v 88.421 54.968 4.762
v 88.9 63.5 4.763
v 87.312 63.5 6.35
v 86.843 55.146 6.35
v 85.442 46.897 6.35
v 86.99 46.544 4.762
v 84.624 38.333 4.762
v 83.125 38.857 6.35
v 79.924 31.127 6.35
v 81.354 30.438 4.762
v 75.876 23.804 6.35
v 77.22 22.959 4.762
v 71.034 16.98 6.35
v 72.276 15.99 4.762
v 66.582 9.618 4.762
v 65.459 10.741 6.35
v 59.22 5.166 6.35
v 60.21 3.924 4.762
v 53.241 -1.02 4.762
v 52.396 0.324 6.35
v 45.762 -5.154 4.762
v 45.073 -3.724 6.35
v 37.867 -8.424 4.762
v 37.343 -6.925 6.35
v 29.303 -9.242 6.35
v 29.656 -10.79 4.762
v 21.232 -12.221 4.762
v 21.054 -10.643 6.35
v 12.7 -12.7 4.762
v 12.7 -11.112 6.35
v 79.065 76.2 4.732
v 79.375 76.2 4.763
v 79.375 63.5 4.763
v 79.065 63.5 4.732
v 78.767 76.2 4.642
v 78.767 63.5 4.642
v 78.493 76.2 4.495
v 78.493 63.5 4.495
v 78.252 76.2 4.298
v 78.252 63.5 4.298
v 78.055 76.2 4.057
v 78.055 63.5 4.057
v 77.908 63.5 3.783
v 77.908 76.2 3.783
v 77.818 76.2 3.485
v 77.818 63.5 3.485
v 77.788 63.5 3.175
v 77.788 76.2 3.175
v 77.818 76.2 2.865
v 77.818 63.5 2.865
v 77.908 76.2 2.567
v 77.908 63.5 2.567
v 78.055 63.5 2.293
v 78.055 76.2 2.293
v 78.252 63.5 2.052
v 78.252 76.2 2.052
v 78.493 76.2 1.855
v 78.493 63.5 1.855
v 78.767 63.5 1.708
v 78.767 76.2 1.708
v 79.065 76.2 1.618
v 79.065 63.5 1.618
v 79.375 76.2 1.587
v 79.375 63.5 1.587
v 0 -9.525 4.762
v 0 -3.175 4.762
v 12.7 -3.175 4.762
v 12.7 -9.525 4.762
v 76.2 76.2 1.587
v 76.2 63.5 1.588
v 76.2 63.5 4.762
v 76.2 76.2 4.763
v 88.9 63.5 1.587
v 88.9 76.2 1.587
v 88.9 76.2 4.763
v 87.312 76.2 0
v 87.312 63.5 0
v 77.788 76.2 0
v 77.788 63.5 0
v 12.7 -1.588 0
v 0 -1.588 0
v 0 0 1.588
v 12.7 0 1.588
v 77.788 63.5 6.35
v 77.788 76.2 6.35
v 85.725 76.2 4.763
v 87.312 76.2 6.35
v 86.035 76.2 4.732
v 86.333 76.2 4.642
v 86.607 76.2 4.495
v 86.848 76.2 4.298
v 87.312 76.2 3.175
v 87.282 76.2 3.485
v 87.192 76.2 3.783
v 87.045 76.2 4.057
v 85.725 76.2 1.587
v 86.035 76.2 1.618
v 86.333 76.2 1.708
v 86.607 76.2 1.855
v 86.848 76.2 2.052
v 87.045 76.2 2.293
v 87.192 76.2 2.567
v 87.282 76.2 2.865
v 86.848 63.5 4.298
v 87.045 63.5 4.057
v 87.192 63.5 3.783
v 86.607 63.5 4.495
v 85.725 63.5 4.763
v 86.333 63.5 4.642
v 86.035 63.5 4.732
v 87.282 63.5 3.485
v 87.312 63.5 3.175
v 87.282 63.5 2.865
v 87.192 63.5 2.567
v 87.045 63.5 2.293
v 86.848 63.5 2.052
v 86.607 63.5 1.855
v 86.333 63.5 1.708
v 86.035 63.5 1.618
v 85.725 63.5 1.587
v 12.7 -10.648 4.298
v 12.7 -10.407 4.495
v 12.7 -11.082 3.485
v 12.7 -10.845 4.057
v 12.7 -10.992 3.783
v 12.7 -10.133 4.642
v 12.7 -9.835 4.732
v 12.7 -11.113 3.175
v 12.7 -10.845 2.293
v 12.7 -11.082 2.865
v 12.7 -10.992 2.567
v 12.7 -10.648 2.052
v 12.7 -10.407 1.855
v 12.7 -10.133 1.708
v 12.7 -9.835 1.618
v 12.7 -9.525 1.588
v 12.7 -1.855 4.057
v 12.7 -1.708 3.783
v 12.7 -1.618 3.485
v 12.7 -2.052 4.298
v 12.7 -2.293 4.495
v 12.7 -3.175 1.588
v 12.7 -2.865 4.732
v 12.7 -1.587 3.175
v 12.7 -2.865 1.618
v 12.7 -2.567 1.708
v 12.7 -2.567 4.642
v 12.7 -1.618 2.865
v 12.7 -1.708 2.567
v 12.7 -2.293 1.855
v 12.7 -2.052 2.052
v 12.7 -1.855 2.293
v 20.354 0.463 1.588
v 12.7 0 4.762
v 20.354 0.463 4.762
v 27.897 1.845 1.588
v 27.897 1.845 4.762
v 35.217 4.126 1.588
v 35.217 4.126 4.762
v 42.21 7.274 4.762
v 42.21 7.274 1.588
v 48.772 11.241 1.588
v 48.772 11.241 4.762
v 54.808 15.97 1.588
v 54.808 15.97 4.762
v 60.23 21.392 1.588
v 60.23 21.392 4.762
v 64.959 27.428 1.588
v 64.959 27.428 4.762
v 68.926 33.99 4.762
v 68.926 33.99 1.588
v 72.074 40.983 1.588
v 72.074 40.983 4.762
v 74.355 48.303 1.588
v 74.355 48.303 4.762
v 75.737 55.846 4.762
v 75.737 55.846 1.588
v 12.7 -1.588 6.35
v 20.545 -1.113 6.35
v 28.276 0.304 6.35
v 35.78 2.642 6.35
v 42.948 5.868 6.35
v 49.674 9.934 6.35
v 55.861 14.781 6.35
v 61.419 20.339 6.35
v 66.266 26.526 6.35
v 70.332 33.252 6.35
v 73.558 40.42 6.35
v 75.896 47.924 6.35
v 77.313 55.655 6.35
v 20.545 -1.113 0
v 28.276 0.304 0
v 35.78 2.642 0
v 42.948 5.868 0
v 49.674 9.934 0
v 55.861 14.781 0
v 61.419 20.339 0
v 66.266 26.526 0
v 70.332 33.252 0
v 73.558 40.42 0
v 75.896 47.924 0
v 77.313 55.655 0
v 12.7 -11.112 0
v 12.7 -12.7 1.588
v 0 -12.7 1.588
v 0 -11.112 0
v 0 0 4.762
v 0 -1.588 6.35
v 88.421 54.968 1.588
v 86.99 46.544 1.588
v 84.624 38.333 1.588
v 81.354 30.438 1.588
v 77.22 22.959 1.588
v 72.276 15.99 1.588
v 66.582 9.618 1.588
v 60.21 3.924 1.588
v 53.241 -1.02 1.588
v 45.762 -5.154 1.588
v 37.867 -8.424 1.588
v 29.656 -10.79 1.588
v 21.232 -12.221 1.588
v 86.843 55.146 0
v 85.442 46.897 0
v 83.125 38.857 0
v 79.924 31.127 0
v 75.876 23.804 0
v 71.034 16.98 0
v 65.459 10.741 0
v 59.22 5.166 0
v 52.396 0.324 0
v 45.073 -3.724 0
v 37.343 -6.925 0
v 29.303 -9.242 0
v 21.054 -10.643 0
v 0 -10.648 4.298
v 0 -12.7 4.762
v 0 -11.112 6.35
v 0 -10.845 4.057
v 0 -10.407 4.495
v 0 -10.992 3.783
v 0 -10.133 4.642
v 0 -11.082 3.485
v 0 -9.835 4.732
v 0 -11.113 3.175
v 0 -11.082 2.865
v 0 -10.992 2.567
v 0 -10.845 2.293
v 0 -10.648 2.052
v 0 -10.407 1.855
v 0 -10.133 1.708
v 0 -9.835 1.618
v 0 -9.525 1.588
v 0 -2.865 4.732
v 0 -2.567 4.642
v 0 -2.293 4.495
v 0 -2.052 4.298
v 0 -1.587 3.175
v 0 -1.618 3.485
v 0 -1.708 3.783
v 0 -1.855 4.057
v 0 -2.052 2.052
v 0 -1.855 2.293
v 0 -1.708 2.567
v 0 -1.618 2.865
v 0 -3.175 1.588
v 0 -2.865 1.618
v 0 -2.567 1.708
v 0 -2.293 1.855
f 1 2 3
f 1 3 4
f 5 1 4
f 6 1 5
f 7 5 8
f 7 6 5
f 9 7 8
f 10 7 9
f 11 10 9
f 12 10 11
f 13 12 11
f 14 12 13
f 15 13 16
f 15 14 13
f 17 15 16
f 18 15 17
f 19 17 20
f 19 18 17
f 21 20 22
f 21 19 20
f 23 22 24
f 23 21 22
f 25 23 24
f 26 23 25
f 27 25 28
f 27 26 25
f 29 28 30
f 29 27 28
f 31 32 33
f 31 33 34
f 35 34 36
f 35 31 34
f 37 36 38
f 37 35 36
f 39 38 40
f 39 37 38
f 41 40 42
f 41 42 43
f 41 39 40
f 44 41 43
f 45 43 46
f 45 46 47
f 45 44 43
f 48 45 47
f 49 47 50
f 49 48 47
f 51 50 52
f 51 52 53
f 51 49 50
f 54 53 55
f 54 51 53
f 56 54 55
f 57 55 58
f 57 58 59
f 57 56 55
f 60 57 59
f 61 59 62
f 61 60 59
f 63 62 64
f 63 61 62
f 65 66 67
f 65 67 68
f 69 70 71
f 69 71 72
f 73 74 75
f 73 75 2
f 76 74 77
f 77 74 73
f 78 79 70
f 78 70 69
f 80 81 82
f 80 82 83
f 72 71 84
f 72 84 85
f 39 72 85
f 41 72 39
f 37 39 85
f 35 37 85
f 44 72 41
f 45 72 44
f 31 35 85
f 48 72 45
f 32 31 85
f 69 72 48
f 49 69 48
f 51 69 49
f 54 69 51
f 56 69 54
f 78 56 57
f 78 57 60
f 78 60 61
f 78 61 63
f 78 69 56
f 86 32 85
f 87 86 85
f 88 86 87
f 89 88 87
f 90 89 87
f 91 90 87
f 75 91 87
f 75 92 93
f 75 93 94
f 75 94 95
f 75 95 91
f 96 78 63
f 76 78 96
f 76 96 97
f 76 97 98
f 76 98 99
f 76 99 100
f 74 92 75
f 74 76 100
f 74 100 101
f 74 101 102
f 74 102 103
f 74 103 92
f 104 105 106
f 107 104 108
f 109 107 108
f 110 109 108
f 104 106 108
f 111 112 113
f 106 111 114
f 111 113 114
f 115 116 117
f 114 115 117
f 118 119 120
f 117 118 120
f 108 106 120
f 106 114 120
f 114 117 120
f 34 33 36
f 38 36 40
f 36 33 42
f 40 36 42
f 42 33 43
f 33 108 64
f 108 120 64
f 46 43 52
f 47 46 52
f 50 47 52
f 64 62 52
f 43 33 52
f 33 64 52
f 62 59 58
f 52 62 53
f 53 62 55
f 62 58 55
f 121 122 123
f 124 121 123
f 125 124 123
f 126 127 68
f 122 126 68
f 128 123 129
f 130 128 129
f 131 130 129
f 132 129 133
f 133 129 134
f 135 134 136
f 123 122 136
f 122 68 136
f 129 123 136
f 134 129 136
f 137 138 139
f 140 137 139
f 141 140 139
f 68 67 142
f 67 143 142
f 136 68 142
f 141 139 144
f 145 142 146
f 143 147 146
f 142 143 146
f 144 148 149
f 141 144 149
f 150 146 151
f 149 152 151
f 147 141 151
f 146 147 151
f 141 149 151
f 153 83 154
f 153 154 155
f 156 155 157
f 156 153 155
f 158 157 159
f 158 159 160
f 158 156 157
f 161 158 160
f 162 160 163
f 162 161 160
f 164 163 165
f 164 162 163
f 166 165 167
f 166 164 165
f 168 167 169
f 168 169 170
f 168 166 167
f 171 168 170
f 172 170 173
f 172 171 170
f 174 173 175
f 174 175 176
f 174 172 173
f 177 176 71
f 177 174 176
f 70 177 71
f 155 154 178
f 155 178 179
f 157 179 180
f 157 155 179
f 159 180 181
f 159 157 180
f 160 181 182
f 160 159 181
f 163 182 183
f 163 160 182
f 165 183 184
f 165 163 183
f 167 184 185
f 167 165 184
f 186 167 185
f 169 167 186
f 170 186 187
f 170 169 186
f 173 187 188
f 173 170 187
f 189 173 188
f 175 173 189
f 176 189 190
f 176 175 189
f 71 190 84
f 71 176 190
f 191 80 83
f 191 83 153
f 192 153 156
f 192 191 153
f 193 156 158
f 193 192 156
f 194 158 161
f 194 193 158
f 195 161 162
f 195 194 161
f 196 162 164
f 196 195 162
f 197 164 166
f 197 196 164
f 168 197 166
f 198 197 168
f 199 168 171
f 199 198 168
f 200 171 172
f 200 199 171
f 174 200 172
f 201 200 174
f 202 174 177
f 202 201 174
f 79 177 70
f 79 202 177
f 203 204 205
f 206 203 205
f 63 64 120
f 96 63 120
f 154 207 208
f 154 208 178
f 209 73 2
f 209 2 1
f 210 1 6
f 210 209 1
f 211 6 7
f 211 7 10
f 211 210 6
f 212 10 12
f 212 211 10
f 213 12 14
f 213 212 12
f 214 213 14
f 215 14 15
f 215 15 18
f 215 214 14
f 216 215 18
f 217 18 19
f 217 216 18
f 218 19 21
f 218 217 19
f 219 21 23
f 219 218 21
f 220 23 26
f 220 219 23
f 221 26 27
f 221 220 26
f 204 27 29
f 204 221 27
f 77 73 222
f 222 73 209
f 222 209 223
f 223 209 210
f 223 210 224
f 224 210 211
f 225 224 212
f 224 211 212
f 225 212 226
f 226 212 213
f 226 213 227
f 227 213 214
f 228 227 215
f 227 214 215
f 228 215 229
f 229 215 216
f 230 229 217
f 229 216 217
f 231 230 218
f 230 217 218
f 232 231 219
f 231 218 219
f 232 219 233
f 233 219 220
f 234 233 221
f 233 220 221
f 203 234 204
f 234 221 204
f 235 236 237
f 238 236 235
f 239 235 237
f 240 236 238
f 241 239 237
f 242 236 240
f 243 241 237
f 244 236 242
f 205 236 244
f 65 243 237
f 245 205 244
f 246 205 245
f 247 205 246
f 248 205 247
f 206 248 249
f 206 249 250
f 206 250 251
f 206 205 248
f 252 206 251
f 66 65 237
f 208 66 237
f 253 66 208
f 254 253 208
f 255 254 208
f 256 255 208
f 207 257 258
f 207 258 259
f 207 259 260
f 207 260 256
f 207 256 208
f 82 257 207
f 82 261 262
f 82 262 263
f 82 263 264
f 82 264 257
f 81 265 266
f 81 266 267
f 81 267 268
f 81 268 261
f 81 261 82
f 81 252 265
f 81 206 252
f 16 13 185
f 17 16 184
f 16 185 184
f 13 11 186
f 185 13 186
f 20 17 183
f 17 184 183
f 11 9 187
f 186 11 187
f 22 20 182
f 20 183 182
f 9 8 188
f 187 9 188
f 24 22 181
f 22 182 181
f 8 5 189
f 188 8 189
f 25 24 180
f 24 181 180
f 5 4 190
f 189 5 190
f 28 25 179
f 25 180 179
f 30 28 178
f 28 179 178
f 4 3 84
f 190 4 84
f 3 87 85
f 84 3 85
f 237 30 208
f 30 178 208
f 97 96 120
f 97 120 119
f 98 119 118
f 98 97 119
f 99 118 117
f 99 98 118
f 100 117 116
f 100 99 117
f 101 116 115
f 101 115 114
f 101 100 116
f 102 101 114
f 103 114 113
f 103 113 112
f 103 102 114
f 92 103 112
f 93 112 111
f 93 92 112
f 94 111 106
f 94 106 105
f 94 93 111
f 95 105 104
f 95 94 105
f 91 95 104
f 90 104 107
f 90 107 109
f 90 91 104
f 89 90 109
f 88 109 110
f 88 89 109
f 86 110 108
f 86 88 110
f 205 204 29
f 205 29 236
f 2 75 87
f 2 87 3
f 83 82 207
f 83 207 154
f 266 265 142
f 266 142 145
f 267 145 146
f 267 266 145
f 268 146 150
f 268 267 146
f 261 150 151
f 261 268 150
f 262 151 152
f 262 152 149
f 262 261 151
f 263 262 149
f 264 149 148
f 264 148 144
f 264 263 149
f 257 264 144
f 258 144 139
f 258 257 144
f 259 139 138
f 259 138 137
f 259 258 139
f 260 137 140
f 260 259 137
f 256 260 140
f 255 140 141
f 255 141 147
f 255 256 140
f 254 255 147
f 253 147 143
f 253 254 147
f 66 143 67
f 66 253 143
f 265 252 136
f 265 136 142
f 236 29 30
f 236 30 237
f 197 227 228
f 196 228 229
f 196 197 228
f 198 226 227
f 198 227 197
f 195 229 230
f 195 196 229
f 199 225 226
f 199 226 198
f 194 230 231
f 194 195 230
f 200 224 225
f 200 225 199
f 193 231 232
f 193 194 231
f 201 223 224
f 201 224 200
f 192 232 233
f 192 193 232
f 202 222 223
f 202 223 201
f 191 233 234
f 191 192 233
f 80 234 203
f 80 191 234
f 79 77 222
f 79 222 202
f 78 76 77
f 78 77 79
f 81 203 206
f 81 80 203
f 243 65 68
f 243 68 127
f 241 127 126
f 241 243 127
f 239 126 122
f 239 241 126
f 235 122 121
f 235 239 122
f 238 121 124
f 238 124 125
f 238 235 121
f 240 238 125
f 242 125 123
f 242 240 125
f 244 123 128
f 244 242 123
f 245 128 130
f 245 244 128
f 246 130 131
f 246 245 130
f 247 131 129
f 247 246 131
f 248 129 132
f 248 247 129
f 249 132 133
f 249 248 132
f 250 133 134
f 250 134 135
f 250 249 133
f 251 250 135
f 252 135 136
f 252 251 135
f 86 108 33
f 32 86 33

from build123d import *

# Parameters (mm, degrees)
BOSS_EXTRUDE1_DEPTH = 6.35
CUT_EXTRUDE2_DEPTH  = 12.7
CUT_EXTRUDE3_DEPTH  = 12.7
CHAMFER2_SIZE       = 1.5875


with BuildPart() as part:
    # Sketch1 → Boss-Extrude1 (new body)
    with BuildSketch(Plane.XY):
        with BuildLine():
            Line((0, 0), (12.7, 0))
            ThreePointArc((12.7, 0), (57.601280605, 18.598719395), (76.2, 63.5))
            Line((76.2, 63.5), (76.2, 76.2))
            Line((76.2, 76.2), (88.9, 76.2))
            Line((88.9, 76.2), (88.9, 63.5))
            ThreePointArc((88.9, 63.5), (66.581536726, 9.618463274), (12.7, -12.7))
            Line((12.7, -12.7), (0, -12.7))
            Line((0, -12.7), (0, 0))
        make_face()
    extrude(amount=BOSS_EXTRUDE1_DEPTH)

    # Sketch2 → Cut-Extrude2 (cut)
    with BuildSketch(Plane(origin=(0, 76.2, 0), x_dir=(1, 0, 0), z_dir=(0, 1, 0))):
        with BuildLine():
            Line((79.375, -1.5875), (85.725, -1.5875))
            ThreePointArc((85.725, -1.5875), (87.3125, -3.175), (85.725, -4.7625))
            Line((85.725, -4.7625), (79.375, -4.7625))
            ThreePointArc((79.375, -4.7625), (77.7875, -3.175), (79.375, -1.5875))
        make_face()
    extrude(amount=-CUT_EXTRUDE2_DEPTH, mode=Mode.SUBTRACT)

    # Sketch4 → Cut-Extrude3 (cut)
    with BuildSketch(Plane.ZY):
        with BuildLine():
            Line((4.7625, -3.175), (4.7625, -9.525))
            ThreePointArc((4.7625, -9.525), (3.175, -11.1125), (1.5875, -9.525))
            Line((1.5875, -9.525), (1.5875, -3.175))
            ThreePointArc((1.5875, -3.175), (3.175, -1.5875), (4.7625, -3.175))
        make_face()
    extrude(amount=-CUT_EXTRUDE3_DEPTH, mode=Mode.SUBTRACT)

    # Chamfer2
    chamfer2_edges = [part.edges().sort_by_distance(p)[0] for p in [
        (66.581536726, 9.618463274, 6.35),
        (6.35, -12.7, 0),
        (88.9, 69.85, 6.35),
        (76.2, 69.85, 6.35),
        (57.601280605, 18.598719395, 6.35),
        (6.35, 0, 6.35),
        (6.35, -12.7, 6.35),
        (6.35, 0, 0),
        (57.601280605, 18.598719395, 0),
        (76.2, 69.85, 0),
        (88.9, 69.85, 0),
        (66.581536726, 9.618463274, 0),
    ]]
    chamfer(chamfer2_edges, length=CHAMFER2_SIZE)


solid = part.part
